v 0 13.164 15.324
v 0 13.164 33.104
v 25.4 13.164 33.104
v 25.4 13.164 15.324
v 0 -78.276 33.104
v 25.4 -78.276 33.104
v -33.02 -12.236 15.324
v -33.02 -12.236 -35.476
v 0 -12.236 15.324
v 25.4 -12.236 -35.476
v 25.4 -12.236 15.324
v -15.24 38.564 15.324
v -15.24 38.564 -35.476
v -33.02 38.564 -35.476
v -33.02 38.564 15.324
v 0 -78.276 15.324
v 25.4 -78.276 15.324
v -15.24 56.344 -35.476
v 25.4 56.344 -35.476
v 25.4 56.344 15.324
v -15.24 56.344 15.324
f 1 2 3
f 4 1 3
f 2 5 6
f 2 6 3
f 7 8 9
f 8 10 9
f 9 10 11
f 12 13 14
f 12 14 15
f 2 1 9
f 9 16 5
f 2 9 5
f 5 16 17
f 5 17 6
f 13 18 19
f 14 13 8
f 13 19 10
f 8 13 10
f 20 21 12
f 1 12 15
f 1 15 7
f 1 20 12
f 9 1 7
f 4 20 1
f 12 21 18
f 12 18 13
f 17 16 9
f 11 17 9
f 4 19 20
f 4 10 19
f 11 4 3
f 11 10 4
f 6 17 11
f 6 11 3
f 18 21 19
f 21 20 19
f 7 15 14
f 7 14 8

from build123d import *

# Parameters (mm, degrees)
F0_W     = 91.44
F0_H     = 17.78
F1_DEPTH = 25.4
F2_W     = 25.4
F2_H     = 25.4
F3_DEPTH = 50.8
F4_W     = 25.4
F4_H     = 50.8
F5_DEPTH = 43.18
F7_DEPTH = 15.24
F8_W     = 50.8
F8_H     = 50.8
F9_DEPTH = 17.78


with BuildPart() as f1:
    # F0 (on Right) → F1 (new body)
    with BuildSketch(Plane.YZ):
        with Locations((-32.5557654617, 24.2135534063)):
            Rectangle(F0_W, F0_H)
    extrude(amount=F1_DEPTH)

    # F2 (on face) → F3 (join)
    with BuildSketch(Plane(origin=(0, 0, 15.3235534063), x_dir=(1, 0, 0), z_dir=(0, 0, -1))):
        with Locations((12.7, -0.4642345383)):
            Rectangle(F2_W, F2_H)
    extrude(amount=F3_DEPTH)

    # F4 (on face) → F5 (join)
    with BuildSketch(Plane(origin=(0, 13.1642345383, 0), x_dir=(-1, 0, 0), z_dir=(0, 1, 0))):
        with Locations((-12.7, -10.0764465937)):
            Rectangle(F4_W, F4_H)
    extrude(amount=F5_DEPTH)

    # F6 (on face) → F7 (join)
    with BuildSketch(Plane(origin=(0, 0, 0), x_dir=(0, -1, 0), z_dir=(-1, 0, 0))):
        Polygon((12.2357654617, 15.3235534063), (-13.1642345383, 15.3235534063), (-56.3442345383, 15.3235534063), (-56.3442345383, -35.4764465937), (12.2357654617, -35.4764465937), align=None)
    extrude(amount=F7_DEPTH)

    # F8 (on face) → F9 (join)
    with BuildSketch(Plane(origin=(-15.24, 0, 0), x_dir=(0, -1, 0), z_dir=(-1, 0, 0))):
        with Locations((-13.1642345383, -10.0764465937)):
            Rectangle(F8_W, F8_H)
    extrude(amount=F9_DEPTH)


solid = f1.part
